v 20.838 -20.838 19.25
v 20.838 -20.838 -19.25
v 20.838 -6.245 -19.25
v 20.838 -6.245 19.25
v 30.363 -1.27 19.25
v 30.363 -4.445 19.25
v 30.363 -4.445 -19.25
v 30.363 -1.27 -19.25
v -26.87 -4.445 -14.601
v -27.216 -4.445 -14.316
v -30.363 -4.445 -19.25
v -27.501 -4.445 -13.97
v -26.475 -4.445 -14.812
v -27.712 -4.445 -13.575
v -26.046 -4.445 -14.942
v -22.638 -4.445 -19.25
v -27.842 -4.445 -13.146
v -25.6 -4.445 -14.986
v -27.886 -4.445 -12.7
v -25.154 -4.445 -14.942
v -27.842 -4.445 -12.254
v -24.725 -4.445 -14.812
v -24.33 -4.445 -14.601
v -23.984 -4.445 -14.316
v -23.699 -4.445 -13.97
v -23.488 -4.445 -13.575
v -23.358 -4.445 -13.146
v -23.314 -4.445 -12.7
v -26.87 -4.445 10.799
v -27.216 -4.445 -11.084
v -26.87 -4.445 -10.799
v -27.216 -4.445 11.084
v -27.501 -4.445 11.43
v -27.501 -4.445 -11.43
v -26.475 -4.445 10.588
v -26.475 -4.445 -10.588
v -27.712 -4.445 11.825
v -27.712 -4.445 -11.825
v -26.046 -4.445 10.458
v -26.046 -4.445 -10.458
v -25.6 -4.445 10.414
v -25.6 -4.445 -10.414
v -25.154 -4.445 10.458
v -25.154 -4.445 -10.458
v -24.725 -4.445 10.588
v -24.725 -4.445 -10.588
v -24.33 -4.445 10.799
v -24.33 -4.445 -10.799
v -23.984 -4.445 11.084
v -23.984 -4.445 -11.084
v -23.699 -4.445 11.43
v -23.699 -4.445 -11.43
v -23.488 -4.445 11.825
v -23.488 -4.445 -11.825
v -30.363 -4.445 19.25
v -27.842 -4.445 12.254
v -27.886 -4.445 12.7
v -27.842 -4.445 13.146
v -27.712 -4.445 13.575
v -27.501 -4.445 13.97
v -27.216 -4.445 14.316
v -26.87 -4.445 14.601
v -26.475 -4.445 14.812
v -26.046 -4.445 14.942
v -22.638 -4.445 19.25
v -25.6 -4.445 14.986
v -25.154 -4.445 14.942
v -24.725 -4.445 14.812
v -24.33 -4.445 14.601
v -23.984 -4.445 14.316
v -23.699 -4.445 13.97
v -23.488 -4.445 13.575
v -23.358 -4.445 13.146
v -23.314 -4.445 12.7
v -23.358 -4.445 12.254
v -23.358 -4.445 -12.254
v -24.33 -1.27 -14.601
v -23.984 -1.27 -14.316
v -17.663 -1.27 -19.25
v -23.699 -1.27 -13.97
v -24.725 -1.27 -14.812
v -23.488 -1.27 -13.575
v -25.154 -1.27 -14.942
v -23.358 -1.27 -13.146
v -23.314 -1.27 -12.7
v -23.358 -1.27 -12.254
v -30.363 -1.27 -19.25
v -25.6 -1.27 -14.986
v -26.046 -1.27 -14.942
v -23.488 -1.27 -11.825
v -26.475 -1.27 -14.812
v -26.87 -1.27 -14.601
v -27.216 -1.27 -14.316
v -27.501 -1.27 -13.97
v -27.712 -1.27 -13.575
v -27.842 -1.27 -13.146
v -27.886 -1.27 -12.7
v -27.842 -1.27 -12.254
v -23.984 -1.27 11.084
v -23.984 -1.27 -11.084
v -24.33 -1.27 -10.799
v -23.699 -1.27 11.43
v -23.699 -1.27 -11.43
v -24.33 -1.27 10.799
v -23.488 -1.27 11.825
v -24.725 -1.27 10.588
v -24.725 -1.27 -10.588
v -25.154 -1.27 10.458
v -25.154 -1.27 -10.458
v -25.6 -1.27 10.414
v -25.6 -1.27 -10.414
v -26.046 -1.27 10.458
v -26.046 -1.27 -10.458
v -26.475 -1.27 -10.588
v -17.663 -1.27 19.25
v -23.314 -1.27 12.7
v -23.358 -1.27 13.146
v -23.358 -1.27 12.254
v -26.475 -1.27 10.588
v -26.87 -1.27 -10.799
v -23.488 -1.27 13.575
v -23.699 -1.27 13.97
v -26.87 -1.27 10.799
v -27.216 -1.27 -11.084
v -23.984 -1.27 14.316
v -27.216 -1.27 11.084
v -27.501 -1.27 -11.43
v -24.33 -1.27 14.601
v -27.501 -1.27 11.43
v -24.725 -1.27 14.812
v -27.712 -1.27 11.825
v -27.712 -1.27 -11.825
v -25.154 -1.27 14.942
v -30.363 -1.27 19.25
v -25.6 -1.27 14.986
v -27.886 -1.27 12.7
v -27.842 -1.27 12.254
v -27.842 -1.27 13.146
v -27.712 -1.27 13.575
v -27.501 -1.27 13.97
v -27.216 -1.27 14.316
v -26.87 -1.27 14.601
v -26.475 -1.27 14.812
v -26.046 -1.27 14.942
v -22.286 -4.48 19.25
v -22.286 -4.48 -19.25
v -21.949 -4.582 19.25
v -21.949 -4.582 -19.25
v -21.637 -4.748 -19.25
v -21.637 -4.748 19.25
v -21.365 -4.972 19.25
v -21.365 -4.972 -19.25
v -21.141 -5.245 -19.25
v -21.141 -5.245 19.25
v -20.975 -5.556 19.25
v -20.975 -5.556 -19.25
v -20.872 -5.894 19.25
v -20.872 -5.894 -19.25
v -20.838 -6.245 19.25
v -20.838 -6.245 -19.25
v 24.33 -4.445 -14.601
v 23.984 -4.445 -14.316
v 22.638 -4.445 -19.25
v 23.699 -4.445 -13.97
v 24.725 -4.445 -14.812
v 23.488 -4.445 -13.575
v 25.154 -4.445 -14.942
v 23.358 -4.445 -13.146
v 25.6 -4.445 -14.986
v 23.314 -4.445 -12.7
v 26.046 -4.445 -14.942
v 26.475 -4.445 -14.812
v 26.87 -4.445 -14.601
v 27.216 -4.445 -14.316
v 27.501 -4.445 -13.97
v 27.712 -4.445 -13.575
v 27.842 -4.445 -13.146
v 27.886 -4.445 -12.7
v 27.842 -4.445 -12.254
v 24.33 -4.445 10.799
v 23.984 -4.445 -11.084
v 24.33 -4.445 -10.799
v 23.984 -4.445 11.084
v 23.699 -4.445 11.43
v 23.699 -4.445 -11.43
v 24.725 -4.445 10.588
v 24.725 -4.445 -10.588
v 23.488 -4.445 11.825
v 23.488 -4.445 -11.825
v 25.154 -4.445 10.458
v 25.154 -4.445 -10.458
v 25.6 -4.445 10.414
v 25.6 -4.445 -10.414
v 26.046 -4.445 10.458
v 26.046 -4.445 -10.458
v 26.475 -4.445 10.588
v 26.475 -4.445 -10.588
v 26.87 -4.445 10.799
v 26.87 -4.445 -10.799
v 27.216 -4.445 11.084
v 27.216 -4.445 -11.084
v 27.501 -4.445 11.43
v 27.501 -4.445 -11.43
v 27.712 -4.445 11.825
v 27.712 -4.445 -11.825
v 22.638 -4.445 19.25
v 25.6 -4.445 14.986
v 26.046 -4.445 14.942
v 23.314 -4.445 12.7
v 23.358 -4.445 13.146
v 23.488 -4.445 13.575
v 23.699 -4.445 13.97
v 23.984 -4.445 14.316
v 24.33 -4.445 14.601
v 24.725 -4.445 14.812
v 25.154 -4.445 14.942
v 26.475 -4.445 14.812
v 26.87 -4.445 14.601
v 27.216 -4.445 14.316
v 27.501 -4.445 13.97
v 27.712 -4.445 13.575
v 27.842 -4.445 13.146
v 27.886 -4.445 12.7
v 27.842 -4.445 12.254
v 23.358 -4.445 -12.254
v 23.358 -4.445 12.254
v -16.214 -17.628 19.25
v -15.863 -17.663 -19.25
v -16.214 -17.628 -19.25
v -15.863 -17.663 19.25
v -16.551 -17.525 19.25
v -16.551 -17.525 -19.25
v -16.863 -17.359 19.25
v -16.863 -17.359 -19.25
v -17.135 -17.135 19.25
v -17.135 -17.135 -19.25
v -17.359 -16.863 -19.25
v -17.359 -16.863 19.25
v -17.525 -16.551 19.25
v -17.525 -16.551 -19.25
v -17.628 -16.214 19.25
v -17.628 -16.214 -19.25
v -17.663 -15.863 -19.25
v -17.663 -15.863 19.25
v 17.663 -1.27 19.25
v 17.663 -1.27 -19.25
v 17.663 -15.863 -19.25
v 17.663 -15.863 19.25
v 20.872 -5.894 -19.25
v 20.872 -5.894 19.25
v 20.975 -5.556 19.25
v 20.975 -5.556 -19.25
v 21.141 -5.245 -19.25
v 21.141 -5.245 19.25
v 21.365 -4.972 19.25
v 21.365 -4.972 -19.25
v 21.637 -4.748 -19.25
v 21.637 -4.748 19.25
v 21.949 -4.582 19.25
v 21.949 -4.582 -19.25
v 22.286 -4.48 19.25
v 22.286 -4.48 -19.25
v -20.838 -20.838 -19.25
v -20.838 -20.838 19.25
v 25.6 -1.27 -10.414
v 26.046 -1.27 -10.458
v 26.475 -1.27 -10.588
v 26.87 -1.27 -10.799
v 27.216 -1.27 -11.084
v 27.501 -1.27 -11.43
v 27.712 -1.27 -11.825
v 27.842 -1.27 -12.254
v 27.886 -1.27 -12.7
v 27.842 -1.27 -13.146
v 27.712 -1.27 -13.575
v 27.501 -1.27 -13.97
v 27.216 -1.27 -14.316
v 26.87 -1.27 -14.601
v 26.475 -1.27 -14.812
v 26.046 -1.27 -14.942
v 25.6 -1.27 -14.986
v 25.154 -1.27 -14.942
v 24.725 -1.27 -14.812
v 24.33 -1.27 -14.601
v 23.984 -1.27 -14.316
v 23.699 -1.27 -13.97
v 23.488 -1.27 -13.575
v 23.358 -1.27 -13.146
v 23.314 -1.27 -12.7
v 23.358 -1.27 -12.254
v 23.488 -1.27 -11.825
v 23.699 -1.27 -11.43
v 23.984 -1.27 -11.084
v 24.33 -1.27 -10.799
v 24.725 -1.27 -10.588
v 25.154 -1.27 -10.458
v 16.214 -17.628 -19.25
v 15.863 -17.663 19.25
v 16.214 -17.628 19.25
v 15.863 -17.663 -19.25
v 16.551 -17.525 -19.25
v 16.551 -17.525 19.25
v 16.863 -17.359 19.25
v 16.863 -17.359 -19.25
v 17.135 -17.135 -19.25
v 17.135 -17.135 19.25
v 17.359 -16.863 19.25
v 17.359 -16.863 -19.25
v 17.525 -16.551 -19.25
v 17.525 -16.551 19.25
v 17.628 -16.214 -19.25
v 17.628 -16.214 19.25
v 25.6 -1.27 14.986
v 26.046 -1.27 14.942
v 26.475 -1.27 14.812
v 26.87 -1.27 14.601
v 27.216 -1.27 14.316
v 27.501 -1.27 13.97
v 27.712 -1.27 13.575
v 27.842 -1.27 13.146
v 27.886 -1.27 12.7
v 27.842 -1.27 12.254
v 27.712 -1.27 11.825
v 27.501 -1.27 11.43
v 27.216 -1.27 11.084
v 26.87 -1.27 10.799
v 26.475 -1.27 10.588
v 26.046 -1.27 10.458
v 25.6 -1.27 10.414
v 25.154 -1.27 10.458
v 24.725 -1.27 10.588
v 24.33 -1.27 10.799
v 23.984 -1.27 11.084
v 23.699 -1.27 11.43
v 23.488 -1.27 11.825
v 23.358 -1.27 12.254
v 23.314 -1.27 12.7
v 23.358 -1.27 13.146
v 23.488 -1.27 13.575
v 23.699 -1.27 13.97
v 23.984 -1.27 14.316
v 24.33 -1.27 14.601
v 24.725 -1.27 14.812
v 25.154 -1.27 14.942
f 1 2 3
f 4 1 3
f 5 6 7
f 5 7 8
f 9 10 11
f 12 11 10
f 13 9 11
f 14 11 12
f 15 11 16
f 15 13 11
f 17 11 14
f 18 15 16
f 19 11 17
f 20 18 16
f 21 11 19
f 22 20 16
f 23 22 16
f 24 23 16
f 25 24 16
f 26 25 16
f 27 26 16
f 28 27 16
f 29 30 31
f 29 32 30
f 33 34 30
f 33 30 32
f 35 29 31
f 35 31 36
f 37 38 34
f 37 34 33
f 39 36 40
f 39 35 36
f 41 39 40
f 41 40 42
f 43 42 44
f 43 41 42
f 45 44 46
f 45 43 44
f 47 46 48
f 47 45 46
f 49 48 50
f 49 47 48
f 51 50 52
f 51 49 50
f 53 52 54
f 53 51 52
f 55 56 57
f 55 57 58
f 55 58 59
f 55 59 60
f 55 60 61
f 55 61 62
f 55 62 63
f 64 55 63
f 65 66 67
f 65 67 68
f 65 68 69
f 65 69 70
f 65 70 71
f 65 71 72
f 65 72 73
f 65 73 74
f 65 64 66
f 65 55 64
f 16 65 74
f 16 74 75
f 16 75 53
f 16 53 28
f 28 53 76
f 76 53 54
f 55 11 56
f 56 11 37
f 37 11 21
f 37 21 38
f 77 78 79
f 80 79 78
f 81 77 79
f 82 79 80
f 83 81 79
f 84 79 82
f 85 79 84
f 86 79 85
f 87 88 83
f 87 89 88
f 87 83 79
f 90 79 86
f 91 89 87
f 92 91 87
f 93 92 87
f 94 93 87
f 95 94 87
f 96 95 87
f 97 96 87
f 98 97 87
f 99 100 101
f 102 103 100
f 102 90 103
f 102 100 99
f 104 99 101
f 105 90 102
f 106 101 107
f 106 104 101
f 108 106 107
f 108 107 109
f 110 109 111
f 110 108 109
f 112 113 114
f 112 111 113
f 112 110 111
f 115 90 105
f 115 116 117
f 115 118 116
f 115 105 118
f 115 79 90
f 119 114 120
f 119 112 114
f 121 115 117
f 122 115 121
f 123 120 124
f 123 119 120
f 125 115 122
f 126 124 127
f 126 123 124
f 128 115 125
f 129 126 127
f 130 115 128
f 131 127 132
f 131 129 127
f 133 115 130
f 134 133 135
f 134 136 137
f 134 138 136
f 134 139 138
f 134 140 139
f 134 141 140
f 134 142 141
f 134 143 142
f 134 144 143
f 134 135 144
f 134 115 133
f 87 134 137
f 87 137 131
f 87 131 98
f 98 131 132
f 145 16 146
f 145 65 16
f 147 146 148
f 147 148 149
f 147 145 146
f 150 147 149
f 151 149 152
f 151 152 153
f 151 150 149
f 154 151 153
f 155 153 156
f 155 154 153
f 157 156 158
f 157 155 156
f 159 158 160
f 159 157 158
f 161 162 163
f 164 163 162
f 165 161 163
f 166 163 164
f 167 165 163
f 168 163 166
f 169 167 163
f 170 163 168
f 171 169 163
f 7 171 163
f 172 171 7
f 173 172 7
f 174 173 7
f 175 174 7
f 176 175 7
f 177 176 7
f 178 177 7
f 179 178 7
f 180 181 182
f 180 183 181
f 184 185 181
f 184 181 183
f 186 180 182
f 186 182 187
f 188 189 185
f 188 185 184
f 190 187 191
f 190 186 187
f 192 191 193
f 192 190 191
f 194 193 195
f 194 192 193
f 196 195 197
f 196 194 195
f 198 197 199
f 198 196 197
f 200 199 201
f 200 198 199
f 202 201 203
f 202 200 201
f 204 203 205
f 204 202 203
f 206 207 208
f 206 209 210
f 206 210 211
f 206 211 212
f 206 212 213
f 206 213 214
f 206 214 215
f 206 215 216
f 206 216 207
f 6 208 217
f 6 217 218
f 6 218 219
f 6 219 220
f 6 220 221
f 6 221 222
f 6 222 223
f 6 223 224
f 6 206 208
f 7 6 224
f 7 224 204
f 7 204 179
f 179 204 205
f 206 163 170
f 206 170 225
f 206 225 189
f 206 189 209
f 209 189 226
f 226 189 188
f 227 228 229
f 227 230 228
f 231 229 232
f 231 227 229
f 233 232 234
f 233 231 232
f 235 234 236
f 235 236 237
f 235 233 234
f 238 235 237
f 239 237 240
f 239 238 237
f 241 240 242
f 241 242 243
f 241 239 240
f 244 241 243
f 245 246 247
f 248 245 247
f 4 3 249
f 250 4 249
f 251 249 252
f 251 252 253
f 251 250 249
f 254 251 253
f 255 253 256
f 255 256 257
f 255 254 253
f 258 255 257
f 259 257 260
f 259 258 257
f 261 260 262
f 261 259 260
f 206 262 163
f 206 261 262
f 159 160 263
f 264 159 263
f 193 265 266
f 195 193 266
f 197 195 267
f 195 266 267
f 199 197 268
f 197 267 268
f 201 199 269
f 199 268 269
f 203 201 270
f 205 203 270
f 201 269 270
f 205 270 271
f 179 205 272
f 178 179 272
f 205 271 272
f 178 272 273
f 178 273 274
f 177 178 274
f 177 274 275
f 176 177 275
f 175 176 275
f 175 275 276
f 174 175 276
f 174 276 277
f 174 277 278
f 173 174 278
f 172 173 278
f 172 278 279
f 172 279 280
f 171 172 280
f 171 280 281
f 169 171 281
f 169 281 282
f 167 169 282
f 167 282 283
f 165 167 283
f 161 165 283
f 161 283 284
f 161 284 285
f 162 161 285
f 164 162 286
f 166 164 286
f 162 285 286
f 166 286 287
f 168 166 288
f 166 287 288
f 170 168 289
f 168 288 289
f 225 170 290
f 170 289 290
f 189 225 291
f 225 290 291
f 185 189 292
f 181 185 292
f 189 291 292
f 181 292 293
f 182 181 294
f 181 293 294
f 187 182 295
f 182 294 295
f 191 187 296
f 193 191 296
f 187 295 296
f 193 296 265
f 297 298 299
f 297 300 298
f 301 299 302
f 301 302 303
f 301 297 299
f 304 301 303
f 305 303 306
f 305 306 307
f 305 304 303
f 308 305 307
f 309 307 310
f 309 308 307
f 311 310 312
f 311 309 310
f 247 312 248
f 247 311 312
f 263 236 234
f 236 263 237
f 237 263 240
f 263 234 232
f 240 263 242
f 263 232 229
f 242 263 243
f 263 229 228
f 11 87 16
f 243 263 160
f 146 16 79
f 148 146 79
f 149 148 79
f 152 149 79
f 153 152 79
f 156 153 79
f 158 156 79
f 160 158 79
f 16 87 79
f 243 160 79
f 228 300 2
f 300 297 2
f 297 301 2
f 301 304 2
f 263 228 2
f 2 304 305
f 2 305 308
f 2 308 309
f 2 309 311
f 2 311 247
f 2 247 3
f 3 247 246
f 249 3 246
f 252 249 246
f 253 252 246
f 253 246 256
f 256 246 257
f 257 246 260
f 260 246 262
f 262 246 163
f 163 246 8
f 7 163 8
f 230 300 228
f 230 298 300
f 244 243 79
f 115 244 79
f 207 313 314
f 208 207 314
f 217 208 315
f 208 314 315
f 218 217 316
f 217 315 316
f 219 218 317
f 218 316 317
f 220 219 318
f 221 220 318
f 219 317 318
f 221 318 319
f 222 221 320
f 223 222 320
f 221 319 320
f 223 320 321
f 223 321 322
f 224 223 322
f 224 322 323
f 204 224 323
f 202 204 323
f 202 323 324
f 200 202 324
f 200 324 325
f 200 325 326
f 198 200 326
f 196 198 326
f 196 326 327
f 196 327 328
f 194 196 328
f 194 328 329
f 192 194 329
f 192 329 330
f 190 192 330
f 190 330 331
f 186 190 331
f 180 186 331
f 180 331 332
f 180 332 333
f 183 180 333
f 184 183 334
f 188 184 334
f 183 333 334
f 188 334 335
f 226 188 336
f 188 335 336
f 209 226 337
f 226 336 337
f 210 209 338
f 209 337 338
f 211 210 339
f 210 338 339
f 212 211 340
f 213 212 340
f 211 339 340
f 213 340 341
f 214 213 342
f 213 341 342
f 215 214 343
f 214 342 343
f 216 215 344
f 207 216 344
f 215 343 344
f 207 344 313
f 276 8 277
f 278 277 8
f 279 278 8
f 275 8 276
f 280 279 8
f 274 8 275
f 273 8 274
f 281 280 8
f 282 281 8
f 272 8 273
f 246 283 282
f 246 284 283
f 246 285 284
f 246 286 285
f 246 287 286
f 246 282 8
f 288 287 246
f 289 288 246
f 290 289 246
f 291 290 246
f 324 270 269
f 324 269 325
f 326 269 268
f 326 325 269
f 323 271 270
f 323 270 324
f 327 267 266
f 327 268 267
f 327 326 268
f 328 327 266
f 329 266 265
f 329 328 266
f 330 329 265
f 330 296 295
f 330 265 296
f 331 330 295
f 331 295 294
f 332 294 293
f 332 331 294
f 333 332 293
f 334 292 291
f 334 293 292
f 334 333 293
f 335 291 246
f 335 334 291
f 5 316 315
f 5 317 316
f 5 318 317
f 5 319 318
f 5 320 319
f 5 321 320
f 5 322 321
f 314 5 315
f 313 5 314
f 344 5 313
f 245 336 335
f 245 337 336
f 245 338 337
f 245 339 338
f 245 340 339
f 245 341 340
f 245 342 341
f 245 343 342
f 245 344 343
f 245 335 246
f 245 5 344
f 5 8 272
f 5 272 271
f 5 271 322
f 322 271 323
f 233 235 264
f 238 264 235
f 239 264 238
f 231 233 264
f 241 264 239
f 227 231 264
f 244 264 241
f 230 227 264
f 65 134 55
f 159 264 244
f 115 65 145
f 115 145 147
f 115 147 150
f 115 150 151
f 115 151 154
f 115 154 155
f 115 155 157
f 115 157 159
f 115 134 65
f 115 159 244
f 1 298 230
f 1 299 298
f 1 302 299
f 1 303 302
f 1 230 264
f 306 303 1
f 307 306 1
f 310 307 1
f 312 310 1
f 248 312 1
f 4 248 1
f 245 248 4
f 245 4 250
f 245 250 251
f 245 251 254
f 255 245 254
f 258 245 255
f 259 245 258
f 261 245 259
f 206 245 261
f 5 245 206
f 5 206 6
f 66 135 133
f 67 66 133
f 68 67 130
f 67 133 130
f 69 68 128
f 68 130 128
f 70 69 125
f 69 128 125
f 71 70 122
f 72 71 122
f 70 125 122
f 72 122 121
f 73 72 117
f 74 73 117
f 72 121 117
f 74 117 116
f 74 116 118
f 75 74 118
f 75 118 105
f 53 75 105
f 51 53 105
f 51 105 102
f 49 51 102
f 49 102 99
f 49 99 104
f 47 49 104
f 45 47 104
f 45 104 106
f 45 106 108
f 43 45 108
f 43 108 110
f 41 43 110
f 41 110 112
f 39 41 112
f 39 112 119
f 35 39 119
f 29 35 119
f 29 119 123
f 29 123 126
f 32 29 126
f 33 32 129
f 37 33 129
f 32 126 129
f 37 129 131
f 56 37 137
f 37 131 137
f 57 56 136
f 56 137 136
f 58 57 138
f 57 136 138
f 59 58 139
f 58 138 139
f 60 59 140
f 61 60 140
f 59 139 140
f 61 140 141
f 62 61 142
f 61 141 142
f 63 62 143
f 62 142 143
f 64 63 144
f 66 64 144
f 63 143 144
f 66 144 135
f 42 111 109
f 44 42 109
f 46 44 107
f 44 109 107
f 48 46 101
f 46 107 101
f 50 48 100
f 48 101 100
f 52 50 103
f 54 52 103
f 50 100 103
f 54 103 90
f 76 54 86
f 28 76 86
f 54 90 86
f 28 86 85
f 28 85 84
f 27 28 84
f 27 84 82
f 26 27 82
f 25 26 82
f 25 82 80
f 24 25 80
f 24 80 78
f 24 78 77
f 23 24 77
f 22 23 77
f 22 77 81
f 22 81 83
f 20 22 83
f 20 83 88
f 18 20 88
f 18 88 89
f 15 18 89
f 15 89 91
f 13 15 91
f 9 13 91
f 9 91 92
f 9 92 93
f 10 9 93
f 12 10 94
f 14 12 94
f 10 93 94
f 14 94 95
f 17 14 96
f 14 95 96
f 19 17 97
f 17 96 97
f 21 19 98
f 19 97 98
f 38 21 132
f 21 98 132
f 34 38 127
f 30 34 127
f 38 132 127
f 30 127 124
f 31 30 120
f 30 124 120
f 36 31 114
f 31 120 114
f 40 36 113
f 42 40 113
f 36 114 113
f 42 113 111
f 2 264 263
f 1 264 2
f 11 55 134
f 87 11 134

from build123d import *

# Parameters (mm, degrees)
BOSS_EXTRUDE2_DEPTH = 19.250000108
SKETCH3_R           = 2.286
CUT_EXTRUDE1_DEPTH  = 41.930807193
FILLET1_R           = 1.8


with BuildPart() as part:
    # Sketch1<3> → Boss-Extrude2 (new, symmetric)
    with BuildSketch(Plane.XY):
        Polygon((17.662500108, -17.662500108), (-17.662500108, -17.662500108), (-17.662500108, -1.27), (-30.362500108, -1.27), (-30.362500108, -4.445), (-20.837500108, -4.445), (-20.837500108, -20.837500108), (20.837500108, -20.837500108), (20.837500108, -4.445), (30.362500108, -4.445), (30.362500108, -1.27), (17.662500108, -1.27), align=None)
    extrude(amount=BOSS_EXTRUDE2_DEPTH, both=True)

    # Sketch3 → Cut-Extrude1 (cut, through all)
    with BuildSketch(Plane(origin=(0, -1.27, 0), x_dir=(1, 0, 0), z_dir=(0, 1, 0))):
        with Locations((-25.600000108, 12.7)):
            Circle(SKETCH3_R)
        with Locations((-25.600000108, -12.7)):
            Circle(SKETCH3_R)
        with Locations((25.600000108, 12.7)):
            Circle(SKETCH3_R)
        with Locations((25.600000108, -12.7)):
            Circle(SKETCH3_R)
    extrude(amount=-CUT_EXTRUDE1_DEPTH, mode=Mode.SUBTRACT)

    # Fillet1
    fillet1_edges = [part.edges().sort_by_distance(p)[0] for p in [
        (-17.662500108, -17.662500108, 0),
        (17.662500108, -17.662500108, 0),
        (20.837500108, -4.445, 0),
        (-20.837500108, -4.445, 0),
    ]]
    fillet(fillet1_edges, radius=FILLET1_R)


solid = part.part
